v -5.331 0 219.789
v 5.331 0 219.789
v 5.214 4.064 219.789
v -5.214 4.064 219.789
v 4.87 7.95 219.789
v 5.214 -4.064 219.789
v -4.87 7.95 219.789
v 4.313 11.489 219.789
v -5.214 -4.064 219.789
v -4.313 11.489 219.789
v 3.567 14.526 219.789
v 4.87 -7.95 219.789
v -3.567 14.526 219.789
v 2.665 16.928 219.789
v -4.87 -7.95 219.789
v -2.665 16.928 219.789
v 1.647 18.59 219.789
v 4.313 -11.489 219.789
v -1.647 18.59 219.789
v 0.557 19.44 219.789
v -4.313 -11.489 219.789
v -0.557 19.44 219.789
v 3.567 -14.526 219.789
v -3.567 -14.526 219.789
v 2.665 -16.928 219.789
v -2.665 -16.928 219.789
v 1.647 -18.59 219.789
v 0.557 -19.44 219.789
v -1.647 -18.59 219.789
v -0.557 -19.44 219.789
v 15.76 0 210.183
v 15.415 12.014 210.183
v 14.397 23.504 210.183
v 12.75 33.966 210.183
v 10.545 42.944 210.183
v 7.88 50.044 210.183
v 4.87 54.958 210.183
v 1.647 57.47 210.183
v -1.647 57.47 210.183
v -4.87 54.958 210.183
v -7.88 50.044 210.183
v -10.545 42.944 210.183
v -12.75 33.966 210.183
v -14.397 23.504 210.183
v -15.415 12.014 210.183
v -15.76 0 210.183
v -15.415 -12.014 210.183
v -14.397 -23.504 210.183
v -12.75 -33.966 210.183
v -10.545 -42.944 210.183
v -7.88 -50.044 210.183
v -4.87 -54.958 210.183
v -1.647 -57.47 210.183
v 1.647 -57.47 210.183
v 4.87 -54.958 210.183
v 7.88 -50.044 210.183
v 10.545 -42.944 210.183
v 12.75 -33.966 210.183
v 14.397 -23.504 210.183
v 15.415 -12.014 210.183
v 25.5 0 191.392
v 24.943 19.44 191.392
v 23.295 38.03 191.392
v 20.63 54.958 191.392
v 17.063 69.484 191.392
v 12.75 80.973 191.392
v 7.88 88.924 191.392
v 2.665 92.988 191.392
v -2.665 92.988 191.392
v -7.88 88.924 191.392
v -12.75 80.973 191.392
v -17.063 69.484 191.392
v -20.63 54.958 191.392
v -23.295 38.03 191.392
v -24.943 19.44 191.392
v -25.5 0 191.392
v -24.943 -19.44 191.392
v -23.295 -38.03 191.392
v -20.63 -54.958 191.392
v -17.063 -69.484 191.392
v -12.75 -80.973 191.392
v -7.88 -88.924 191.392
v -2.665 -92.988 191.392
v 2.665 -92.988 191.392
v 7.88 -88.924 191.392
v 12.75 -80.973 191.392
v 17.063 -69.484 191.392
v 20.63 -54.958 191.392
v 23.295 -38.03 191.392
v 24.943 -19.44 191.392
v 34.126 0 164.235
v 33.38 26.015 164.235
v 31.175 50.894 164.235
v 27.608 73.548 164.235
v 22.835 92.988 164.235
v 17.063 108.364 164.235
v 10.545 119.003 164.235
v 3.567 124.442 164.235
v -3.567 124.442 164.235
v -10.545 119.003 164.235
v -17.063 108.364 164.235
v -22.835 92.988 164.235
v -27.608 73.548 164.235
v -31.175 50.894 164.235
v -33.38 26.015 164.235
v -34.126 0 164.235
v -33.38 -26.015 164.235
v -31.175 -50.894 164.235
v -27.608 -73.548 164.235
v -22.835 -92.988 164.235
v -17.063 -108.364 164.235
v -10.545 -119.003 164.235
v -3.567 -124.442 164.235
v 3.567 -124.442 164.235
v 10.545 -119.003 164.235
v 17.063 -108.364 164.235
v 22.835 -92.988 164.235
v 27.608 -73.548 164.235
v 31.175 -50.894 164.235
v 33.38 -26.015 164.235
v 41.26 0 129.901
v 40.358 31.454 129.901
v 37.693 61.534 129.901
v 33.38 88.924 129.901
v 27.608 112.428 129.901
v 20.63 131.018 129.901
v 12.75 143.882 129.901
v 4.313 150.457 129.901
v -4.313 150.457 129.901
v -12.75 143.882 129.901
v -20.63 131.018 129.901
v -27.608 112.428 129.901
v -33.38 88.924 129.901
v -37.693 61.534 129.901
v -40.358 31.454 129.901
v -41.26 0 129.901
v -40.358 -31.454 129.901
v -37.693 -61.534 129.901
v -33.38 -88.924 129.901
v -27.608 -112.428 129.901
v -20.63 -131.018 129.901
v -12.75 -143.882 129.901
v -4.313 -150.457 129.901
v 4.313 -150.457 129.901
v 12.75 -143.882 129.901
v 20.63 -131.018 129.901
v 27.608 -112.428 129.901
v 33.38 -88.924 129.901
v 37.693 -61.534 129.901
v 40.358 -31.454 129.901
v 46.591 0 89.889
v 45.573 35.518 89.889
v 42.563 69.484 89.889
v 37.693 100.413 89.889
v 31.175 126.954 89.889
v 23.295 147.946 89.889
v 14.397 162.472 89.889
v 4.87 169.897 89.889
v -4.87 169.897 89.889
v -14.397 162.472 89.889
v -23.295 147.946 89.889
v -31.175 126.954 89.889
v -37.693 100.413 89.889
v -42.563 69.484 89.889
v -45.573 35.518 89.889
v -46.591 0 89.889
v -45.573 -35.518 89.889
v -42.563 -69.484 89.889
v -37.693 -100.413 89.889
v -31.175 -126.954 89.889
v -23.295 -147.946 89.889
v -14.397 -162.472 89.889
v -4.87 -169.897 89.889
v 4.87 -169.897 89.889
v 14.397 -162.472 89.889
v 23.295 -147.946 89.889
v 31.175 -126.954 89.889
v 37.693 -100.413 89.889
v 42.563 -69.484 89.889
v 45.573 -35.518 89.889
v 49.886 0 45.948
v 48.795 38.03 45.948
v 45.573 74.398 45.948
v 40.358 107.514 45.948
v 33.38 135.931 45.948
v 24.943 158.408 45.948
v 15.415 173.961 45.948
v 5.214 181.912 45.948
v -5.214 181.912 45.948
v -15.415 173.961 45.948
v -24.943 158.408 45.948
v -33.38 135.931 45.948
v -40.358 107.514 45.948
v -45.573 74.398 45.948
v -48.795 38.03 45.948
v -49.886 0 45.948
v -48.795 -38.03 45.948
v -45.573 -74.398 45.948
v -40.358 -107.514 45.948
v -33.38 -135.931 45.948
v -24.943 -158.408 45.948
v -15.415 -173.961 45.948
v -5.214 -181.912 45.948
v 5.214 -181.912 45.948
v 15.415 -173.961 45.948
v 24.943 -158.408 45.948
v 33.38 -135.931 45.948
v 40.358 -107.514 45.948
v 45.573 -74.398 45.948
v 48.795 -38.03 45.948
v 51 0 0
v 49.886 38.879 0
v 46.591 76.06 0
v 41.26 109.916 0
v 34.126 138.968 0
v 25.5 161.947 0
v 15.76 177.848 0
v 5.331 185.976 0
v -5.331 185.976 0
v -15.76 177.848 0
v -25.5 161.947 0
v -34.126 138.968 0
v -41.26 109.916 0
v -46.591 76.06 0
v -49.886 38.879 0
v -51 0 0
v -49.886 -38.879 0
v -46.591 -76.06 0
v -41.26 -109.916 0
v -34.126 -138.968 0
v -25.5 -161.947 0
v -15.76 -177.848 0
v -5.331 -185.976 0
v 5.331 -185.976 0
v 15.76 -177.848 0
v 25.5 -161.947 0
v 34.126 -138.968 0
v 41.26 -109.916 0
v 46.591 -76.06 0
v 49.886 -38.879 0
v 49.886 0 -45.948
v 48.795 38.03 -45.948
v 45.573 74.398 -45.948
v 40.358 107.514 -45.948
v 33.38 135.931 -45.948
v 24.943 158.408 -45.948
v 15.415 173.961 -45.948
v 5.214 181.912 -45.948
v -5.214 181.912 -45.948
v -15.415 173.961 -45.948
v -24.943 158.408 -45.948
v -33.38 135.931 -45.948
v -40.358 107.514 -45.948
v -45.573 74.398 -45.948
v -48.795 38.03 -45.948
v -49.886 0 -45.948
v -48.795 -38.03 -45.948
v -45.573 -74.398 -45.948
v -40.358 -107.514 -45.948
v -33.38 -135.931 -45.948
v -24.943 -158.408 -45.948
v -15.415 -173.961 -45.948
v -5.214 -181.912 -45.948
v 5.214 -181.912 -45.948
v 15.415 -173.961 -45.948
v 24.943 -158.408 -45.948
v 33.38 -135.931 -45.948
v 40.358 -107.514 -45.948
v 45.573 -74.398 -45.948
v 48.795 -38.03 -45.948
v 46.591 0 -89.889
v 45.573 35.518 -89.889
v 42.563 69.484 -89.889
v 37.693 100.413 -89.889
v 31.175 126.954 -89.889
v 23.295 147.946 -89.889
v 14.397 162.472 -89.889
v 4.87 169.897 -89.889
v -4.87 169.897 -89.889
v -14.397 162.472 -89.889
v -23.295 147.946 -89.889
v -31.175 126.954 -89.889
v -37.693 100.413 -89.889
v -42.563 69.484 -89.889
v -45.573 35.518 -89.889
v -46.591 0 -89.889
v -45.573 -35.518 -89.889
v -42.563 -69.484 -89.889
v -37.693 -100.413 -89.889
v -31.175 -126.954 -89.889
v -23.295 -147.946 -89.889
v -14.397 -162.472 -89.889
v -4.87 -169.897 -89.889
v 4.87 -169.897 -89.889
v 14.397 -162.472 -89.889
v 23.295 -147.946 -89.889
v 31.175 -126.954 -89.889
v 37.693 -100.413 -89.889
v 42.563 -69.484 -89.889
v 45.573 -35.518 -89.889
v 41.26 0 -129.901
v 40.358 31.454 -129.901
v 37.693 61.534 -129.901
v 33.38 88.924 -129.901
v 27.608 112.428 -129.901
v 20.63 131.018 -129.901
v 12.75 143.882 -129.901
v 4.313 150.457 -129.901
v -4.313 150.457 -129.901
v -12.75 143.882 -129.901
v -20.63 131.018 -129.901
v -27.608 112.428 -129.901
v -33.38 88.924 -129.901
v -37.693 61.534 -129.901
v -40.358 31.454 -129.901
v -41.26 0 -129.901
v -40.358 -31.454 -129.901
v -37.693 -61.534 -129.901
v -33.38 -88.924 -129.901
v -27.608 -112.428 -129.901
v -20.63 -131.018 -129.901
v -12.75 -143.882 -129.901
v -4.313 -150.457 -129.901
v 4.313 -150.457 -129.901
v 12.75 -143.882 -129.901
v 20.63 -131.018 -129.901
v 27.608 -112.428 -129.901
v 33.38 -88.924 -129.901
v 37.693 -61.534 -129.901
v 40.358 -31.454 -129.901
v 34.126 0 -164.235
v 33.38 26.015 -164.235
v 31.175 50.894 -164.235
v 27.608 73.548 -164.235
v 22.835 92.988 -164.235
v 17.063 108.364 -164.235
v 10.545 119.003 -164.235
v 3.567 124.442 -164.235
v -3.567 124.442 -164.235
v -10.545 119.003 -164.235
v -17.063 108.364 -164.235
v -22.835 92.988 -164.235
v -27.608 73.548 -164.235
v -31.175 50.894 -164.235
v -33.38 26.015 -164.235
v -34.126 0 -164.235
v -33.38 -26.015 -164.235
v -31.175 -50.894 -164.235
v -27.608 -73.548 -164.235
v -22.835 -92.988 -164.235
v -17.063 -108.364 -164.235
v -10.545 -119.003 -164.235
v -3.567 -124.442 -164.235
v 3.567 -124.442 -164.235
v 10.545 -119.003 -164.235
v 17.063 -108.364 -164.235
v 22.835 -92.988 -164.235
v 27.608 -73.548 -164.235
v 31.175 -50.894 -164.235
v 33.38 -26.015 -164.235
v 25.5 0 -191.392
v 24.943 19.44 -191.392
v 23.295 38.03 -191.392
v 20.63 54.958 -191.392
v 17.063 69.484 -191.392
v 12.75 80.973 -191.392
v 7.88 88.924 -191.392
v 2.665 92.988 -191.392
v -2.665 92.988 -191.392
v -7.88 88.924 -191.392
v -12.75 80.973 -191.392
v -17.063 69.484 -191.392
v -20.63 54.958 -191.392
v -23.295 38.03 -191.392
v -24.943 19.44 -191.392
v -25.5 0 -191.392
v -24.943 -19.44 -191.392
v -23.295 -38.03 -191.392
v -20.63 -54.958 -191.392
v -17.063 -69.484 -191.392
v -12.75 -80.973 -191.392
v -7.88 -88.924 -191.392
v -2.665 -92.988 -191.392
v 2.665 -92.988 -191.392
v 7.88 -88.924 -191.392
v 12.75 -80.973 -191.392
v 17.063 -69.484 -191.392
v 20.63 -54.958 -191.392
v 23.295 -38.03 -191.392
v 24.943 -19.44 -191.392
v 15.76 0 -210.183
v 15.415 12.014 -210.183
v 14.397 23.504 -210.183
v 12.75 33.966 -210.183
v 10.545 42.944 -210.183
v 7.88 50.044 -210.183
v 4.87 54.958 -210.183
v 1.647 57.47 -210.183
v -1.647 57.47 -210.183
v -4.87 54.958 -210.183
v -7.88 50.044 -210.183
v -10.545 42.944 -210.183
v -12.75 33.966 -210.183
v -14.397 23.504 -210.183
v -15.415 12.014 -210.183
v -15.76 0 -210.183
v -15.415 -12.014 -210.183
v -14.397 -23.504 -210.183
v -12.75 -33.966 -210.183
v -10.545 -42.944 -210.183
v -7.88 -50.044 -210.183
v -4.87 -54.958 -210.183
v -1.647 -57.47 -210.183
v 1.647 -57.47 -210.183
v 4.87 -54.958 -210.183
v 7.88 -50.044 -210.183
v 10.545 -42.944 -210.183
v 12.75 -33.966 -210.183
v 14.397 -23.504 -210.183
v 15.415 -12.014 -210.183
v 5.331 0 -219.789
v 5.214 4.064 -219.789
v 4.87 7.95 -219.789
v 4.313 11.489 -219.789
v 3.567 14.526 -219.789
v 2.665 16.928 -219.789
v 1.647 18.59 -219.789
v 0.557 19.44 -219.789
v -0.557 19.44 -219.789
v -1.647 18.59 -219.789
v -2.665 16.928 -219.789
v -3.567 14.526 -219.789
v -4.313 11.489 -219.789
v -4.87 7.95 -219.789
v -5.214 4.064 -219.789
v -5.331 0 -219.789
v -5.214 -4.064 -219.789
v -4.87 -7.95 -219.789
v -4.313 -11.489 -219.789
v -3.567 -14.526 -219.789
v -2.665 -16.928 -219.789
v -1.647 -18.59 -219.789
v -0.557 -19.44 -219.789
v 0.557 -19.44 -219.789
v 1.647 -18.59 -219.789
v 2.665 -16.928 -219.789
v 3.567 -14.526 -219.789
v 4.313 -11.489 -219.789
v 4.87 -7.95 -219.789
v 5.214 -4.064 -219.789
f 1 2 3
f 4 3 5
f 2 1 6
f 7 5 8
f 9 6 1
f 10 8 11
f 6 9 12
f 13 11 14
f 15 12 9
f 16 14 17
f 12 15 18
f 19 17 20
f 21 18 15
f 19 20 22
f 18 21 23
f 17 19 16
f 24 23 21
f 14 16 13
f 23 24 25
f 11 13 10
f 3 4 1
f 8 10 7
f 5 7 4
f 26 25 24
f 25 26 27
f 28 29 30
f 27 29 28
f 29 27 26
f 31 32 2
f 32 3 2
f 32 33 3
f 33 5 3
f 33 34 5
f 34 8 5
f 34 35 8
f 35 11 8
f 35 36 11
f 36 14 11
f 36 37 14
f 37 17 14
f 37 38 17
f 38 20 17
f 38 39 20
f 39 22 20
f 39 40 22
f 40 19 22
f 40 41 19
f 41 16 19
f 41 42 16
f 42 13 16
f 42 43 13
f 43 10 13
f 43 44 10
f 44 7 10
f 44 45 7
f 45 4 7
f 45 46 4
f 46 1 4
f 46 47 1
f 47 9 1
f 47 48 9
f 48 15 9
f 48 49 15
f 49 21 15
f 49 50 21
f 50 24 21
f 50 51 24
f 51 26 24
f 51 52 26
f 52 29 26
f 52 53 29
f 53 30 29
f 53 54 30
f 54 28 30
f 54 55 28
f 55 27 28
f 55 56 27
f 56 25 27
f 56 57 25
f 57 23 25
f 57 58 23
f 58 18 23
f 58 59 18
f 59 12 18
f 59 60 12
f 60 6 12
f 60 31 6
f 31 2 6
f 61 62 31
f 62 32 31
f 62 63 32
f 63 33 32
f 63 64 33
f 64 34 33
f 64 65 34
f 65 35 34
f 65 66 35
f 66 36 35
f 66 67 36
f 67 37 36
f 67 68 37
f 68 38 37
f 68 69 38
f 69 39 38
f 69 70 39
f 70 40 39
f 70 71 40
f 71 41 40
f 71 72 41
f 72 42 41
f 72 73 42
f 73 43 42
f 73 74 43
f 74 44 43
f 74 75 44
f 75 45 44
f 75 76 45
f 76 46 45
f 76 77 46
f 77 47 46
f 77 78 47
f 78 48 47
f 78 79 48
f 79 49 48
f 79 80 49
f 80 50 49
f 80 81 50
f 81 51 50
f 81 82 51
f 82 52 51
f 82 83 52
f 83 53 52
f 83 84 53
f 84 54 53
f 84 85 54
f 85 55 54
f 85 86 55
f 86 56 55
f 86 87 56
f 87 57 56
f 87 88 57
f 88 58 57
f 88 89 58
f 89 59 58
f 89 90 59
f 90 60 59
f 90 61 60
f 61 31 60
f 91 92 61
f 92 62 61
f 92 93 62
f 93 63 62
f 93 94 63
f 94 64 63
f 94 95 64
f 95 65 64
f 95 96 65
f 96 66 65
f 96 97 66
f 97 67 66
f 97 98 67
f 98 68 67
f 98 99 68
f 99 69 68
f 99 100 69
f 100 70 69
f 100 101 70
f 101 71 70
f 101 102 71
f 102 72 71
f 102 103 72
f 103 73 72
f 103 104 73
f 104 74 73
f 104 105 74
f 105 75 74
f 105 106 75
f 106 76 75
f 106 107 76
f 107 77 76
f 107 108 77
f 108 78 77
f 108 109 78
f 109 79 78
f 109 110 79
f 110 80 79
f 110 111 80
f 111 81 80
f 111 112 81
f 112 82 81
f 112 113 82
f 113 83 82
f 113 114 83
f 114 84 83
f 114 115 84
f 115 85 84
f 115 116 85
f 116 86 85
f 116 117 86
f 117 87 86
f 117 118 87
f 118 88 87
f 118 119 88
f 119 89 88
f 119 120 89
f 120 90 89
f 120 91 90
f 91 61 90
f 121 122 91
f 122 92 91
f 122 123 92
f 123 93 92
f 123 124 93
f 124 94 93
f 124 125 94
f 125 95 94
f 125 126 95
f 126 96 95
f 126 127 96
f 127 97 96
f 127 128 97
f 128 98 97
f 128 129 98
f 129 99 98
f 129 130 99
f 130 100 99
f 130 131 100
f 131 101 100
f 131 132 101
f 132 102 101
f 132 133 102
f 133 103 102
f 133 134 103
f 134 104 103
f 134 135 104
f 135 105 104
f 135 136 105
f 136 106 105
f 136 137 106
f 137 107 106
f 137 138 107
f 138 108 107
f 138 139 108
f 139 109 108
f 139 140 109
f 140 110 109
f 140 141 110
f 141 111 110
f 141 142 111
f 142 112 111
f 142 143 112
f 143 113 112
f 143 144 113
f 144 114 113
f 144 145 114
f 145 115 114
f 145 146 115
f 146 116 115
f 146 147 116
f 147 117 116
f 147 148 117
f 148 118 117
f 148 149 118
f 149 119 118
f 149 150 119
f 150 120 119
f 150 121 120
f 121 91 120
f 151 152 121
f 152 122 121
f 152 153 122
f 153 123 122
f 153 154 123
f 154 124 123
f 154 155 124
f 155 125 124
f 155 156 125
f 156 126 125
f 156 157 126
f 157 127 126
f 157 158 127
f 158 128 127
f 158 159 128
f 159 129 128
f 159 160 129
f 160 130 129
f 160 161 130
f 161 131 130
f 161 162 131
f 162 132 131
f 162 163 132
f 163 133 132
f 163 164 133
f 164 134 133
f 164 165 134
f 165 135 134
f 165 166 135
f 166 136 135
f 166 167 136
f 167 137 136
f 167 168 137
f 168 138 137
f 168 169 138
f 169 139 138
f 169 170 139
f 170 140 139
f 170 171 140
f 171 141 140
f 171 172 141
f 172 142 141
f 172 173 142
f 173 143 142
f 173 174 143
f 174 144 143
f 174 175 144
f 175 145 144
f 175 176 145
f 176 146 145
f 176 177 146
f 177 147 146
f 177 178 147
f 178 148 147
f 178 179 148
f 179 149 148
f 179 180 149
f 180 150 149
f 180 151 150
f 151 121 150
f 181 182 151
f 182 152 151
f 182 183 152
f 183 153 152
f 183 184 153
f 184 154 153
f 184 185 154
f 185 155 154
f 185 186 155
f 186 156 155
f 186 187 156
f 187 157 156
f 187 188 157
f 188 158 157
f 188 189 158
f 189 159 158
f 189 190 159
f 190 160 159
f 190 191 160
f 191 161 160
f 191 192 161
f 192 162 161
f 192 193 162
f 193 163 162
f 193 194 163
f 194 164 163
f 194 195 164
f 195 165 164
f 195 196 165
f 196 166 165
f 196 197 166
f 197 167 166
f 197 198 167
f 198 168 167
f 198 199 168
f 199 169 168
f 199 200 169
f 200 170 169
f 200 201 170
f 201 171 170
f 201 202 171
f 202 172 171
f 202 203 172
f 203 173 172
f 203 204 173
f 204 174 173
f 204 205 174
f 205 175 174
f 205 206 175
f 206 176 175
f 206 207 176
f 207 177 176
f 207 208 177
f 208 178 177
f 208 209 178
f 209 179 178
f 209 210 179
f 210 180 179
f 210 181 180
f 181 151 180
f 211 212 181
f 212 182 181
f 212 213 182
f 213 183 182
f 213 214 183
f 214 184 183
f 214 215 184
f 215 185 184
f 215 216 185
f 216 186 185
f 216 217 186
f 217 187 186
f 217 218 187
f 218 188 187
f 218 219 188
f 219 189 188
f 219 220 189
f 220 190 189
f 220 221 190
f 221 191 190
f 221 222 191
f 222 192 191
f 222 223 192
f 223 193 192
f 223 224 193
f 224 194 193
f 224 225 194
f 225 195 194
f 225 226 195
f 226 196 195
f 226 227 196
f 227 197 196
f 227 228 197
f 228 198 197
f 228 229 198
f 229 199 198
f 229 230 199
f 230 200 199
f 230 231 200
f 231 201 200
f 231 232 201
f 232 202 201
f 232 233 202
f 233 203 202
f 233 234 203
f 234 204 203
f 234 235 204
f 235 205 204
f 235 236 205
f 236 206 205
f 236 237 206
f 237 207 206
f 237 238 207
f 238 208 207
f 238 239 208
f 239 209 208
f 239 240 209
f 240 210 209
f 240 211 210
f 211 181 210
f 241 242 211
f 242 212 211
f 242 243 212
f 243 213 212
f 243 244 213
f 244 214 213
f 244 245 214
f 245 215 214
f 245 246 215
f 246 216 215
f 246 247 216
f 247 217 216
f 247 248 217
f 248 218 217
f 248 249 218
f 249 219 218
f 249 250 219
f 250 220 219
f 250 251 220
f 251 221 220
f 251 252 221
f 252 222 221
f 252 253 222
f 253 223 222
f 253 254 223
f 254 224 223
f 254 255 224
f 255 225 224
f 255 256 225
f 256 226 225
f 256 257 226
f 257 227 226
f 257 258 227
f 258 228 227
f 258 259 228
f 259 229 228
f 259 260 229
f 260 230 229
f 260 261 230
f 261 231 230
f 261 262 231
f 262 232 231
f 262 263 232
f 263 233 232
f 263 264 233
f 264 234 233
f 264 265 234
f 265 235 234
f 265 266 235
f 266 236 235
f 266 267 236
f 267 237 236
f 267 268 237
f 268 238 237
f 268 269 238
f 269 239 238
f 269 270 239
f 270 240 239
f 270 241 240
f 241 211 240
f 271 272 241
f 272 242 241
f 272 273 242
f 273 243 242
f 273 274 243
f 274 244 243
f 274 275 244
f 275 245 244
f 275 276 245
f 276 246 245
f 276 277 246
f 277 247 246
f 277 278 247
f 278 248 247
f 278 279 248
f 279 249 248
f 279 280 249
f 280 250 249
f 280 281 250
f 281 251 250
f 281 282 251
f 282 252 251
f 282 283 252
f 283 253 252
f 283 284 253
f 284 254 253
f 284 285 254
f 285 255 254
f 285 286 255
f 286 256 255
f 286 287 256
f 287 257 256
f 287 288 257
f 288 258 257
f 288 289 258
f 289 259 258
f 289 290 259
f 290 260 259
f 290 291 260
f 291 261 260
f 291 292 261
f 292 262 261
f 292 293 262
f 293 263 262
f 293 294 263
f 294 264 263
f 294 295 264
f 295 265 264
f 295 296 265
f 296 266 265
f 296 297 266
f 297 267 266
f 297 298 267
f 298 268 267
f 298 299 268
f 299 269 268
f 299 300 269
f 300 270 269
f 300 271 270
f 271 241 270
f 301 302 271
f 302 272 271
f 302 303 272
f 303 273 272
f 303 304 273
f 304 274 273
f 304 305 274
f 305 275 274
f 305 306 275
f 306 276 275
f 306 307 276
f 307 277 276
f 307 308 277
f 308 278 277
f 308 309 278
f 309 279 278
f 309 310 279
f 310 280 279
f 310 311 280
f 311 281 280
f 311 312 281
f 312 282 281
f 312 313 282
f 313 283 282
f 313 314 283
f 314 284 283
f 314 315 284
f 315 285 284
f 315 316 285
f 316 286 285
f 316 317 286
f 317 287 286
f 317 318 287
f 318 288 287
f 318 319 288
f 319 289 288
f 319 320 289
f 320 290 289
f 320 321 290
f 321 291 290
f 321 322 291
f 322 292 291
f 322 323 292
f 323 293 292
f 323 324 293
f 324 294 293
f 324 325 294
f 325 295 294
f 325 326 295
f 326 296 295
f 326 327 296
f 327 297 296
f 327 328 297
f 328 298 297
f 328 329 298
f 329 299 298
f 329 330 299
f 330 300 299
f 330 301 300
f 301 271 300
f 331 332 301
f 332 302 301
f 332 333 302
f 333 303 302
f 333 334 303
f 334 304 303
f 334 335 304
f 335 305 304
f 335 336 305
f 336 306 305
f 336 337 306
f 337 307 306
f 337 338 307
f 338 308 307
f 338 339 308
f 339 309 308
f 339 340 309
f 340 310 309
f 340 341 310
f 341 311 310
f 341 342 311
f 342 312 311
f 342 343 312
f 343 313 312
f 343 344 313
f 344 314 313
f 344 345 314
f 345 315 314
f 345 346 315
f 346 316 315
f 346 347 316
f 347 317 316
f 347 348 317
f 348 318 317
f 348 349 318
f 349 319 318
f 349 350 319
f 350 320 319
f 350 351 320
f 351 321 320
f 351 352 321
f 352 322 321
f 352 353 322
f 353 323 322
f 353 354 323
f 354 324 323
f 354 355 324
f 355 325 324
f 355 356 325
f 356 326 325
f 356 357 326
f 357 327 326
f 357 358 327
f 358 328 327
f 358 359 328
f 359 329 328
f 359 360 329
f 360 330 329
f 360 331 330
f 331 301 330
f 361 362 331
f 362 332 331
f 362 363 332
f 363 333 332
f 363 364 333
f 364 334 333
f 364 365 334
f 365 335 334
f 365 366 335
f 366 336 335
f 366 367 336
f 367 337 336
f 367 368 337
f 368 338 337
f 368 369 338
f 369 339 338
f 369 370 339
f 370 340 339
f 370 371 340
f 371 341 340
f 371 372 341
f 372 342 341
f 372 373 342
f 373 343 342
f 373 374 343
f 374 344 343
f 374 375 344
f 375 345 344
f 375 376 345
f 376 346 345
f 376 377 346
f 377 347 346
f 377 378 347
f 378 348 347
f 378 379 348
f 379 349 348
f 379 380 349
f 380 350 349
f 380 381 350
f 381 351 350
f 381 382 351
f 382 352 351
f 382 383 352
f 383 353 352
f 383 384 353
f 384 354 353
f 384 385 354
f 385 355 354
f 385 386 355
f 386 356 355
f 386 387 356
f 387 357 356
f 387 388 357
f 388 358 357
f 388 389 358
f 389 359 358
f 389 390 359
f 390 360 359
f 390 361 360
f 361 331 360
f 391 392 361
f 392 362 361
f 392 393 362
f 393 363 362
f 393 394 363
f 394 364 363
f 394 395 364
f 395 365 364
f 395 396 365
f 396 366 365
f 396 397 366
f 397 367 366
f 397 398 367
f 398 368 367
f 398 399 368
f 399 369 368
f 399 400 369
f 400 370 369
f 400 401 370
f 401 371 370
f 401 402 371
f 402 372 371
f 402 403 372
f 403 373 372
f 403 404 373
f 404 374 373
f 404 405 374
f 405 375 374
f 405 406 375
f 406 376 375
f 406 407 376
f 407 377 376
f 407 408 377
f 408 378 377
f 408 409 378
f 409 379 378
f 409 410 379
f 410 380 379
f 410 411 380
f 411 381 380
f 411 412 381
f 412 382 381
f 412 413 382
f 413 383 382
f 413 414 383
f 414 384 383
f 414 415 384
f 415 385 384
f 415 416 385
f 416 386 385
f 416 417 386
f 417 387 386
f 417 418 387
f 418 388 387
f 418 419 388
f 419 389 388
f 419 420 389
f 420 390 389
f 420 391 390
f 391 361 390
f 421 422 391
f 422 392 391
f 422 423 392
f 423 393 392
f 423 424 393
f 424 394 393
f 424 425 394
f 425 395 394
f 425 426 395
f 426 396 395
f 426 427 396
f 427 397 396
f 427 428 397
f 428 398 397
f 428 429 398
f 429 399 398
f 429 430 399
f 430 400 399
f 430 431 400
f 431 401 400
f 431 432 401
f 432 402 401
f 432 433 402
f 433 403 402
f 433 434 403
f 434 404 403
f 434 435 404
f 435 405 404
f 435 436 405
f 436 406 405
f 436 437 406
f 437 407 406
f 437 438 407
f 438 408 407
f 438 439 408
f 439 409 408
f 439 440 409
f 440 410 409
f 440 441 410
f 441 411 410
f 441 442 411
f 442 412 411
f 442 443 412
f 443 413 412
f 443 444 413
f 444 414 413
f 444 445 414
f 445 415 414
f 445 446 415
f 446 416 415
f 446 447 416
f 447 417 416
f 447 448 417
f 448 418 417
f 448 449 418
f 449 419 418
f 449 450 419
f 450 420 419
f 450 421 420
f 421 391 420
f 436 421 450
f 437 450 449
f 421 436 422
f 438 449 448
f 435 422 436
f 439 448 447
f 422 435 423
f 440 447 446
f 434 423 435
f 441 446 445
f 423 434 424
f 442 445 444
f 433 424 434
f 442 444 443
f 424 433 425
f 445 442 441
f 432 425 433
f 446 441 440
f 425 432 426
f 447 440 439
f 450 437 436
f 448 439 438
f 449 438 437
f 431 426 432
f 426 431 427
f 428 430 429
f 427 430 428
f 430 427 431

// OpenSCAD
// Generated by SolidPython 1.0.1 on 2020-07-29 00:46:45


scale(v = [3, 11, 13]) {
	sphere(r = 17);
}
/***********************************************
*********      SolidPython code:      **********
************************************************
 
# import packages: SolidPython
from solid import *
from solid.utils import *
from itertools import chain, combinations, permutations


class Resize:

    def __init__(self, scad_file):
        self.scad_file = scad_file
        #self.scad_file = import_scad(scad_file)
        # cone/cylinder param:
        self.r1 = 0
        self.r2 = 0
        self.h = 0
        # rectangular prism param:
        self.w = 0
        self.l = 0
        # ellipse param:
        self.r = 0

    # import OpenScad code (file name corresponds to shape)


    # classify shape + parameters
    def assign(self, param1, param2, param3):
        if self.scad_file == 'cone.scad':
            self.r1 = param1
            self.r2 = param2
            self.h = param3
        elif self.scad_file == 'cylinder.scad':
            self.r1 = param1
            self.r2 = param2
            self.h = param3
        elif self.scad_file == 'rectangularPrism.scad':
            self.h = param1
            self.l = param2
            self.w = param3
        else:
            self.r = param1
            self.h = param2

    # resize parameters
    def iterate(self):
        x = range(3, 20, 2)
        i = 1
        if self.scad_file == 'cone.scad':
            tempList = list(permutations(x, 2))
            for temp in tempList:
                param1 = temp[0]
                param2 = temp[1]
                filepath = 'produced_scad_files/' + 'cone' + str(param1) + '_' + str(param2) + '_' + '.scad'
                scad_render_to_file(cylinder(h=param1, r1=param2, r2=0), filepath)

        elif self.scad_file == 'cylinder.scad':
            tempList = list(permutations(x, 3))
            for temp in tempList:
                param1 = temp[0]
                param2 = temp[1]
                filepath = 'produced_scad_files/' + 'cylinder' + str(param1) + '_' + str(param2) + '_' + '.scad'
                scad_render_to_file(cylinder(h=param1, r1=param2, r2=param2), filepath)

        elif self.scad_file == 'rectangularPrism.scad':
            tempList = list(permutations(x, 3))
            for temp in tempList:
                param1 = temp[0]
                param2 = temp[1]
                param3 = temp[2]
                filepath = 'produced_scad_files/' + 'rectangularPrism' + str(param1) + '_' + str(param2) + '_' + str(
                    param3) + '.scad'
                scad_render_to_file(cube(size=(param1, param2, param3)), filepath)

        elif self.scad_file == 'ellipse.scad':
            tempList = list(permutations(x, 4))
            for temp in tempList:
                param1 = temp[0]
                param2 = temp[1]
                param3 = temp[2]
                param4 = temp[3]
                filepath = 'produced_scad_files/' + 'ellipse' + str(param1) + '_' + str(param2) + '_' + str(param3) + '_' + str(param4) + '.scad'
                scad_render_to_file(scale([param1, param2, param3])(sphere(r=param4)), filepath)

    def render_to_scadfile(self):
        scad_render_to_file(scad, 'example.scad') 
 
************************************************/
